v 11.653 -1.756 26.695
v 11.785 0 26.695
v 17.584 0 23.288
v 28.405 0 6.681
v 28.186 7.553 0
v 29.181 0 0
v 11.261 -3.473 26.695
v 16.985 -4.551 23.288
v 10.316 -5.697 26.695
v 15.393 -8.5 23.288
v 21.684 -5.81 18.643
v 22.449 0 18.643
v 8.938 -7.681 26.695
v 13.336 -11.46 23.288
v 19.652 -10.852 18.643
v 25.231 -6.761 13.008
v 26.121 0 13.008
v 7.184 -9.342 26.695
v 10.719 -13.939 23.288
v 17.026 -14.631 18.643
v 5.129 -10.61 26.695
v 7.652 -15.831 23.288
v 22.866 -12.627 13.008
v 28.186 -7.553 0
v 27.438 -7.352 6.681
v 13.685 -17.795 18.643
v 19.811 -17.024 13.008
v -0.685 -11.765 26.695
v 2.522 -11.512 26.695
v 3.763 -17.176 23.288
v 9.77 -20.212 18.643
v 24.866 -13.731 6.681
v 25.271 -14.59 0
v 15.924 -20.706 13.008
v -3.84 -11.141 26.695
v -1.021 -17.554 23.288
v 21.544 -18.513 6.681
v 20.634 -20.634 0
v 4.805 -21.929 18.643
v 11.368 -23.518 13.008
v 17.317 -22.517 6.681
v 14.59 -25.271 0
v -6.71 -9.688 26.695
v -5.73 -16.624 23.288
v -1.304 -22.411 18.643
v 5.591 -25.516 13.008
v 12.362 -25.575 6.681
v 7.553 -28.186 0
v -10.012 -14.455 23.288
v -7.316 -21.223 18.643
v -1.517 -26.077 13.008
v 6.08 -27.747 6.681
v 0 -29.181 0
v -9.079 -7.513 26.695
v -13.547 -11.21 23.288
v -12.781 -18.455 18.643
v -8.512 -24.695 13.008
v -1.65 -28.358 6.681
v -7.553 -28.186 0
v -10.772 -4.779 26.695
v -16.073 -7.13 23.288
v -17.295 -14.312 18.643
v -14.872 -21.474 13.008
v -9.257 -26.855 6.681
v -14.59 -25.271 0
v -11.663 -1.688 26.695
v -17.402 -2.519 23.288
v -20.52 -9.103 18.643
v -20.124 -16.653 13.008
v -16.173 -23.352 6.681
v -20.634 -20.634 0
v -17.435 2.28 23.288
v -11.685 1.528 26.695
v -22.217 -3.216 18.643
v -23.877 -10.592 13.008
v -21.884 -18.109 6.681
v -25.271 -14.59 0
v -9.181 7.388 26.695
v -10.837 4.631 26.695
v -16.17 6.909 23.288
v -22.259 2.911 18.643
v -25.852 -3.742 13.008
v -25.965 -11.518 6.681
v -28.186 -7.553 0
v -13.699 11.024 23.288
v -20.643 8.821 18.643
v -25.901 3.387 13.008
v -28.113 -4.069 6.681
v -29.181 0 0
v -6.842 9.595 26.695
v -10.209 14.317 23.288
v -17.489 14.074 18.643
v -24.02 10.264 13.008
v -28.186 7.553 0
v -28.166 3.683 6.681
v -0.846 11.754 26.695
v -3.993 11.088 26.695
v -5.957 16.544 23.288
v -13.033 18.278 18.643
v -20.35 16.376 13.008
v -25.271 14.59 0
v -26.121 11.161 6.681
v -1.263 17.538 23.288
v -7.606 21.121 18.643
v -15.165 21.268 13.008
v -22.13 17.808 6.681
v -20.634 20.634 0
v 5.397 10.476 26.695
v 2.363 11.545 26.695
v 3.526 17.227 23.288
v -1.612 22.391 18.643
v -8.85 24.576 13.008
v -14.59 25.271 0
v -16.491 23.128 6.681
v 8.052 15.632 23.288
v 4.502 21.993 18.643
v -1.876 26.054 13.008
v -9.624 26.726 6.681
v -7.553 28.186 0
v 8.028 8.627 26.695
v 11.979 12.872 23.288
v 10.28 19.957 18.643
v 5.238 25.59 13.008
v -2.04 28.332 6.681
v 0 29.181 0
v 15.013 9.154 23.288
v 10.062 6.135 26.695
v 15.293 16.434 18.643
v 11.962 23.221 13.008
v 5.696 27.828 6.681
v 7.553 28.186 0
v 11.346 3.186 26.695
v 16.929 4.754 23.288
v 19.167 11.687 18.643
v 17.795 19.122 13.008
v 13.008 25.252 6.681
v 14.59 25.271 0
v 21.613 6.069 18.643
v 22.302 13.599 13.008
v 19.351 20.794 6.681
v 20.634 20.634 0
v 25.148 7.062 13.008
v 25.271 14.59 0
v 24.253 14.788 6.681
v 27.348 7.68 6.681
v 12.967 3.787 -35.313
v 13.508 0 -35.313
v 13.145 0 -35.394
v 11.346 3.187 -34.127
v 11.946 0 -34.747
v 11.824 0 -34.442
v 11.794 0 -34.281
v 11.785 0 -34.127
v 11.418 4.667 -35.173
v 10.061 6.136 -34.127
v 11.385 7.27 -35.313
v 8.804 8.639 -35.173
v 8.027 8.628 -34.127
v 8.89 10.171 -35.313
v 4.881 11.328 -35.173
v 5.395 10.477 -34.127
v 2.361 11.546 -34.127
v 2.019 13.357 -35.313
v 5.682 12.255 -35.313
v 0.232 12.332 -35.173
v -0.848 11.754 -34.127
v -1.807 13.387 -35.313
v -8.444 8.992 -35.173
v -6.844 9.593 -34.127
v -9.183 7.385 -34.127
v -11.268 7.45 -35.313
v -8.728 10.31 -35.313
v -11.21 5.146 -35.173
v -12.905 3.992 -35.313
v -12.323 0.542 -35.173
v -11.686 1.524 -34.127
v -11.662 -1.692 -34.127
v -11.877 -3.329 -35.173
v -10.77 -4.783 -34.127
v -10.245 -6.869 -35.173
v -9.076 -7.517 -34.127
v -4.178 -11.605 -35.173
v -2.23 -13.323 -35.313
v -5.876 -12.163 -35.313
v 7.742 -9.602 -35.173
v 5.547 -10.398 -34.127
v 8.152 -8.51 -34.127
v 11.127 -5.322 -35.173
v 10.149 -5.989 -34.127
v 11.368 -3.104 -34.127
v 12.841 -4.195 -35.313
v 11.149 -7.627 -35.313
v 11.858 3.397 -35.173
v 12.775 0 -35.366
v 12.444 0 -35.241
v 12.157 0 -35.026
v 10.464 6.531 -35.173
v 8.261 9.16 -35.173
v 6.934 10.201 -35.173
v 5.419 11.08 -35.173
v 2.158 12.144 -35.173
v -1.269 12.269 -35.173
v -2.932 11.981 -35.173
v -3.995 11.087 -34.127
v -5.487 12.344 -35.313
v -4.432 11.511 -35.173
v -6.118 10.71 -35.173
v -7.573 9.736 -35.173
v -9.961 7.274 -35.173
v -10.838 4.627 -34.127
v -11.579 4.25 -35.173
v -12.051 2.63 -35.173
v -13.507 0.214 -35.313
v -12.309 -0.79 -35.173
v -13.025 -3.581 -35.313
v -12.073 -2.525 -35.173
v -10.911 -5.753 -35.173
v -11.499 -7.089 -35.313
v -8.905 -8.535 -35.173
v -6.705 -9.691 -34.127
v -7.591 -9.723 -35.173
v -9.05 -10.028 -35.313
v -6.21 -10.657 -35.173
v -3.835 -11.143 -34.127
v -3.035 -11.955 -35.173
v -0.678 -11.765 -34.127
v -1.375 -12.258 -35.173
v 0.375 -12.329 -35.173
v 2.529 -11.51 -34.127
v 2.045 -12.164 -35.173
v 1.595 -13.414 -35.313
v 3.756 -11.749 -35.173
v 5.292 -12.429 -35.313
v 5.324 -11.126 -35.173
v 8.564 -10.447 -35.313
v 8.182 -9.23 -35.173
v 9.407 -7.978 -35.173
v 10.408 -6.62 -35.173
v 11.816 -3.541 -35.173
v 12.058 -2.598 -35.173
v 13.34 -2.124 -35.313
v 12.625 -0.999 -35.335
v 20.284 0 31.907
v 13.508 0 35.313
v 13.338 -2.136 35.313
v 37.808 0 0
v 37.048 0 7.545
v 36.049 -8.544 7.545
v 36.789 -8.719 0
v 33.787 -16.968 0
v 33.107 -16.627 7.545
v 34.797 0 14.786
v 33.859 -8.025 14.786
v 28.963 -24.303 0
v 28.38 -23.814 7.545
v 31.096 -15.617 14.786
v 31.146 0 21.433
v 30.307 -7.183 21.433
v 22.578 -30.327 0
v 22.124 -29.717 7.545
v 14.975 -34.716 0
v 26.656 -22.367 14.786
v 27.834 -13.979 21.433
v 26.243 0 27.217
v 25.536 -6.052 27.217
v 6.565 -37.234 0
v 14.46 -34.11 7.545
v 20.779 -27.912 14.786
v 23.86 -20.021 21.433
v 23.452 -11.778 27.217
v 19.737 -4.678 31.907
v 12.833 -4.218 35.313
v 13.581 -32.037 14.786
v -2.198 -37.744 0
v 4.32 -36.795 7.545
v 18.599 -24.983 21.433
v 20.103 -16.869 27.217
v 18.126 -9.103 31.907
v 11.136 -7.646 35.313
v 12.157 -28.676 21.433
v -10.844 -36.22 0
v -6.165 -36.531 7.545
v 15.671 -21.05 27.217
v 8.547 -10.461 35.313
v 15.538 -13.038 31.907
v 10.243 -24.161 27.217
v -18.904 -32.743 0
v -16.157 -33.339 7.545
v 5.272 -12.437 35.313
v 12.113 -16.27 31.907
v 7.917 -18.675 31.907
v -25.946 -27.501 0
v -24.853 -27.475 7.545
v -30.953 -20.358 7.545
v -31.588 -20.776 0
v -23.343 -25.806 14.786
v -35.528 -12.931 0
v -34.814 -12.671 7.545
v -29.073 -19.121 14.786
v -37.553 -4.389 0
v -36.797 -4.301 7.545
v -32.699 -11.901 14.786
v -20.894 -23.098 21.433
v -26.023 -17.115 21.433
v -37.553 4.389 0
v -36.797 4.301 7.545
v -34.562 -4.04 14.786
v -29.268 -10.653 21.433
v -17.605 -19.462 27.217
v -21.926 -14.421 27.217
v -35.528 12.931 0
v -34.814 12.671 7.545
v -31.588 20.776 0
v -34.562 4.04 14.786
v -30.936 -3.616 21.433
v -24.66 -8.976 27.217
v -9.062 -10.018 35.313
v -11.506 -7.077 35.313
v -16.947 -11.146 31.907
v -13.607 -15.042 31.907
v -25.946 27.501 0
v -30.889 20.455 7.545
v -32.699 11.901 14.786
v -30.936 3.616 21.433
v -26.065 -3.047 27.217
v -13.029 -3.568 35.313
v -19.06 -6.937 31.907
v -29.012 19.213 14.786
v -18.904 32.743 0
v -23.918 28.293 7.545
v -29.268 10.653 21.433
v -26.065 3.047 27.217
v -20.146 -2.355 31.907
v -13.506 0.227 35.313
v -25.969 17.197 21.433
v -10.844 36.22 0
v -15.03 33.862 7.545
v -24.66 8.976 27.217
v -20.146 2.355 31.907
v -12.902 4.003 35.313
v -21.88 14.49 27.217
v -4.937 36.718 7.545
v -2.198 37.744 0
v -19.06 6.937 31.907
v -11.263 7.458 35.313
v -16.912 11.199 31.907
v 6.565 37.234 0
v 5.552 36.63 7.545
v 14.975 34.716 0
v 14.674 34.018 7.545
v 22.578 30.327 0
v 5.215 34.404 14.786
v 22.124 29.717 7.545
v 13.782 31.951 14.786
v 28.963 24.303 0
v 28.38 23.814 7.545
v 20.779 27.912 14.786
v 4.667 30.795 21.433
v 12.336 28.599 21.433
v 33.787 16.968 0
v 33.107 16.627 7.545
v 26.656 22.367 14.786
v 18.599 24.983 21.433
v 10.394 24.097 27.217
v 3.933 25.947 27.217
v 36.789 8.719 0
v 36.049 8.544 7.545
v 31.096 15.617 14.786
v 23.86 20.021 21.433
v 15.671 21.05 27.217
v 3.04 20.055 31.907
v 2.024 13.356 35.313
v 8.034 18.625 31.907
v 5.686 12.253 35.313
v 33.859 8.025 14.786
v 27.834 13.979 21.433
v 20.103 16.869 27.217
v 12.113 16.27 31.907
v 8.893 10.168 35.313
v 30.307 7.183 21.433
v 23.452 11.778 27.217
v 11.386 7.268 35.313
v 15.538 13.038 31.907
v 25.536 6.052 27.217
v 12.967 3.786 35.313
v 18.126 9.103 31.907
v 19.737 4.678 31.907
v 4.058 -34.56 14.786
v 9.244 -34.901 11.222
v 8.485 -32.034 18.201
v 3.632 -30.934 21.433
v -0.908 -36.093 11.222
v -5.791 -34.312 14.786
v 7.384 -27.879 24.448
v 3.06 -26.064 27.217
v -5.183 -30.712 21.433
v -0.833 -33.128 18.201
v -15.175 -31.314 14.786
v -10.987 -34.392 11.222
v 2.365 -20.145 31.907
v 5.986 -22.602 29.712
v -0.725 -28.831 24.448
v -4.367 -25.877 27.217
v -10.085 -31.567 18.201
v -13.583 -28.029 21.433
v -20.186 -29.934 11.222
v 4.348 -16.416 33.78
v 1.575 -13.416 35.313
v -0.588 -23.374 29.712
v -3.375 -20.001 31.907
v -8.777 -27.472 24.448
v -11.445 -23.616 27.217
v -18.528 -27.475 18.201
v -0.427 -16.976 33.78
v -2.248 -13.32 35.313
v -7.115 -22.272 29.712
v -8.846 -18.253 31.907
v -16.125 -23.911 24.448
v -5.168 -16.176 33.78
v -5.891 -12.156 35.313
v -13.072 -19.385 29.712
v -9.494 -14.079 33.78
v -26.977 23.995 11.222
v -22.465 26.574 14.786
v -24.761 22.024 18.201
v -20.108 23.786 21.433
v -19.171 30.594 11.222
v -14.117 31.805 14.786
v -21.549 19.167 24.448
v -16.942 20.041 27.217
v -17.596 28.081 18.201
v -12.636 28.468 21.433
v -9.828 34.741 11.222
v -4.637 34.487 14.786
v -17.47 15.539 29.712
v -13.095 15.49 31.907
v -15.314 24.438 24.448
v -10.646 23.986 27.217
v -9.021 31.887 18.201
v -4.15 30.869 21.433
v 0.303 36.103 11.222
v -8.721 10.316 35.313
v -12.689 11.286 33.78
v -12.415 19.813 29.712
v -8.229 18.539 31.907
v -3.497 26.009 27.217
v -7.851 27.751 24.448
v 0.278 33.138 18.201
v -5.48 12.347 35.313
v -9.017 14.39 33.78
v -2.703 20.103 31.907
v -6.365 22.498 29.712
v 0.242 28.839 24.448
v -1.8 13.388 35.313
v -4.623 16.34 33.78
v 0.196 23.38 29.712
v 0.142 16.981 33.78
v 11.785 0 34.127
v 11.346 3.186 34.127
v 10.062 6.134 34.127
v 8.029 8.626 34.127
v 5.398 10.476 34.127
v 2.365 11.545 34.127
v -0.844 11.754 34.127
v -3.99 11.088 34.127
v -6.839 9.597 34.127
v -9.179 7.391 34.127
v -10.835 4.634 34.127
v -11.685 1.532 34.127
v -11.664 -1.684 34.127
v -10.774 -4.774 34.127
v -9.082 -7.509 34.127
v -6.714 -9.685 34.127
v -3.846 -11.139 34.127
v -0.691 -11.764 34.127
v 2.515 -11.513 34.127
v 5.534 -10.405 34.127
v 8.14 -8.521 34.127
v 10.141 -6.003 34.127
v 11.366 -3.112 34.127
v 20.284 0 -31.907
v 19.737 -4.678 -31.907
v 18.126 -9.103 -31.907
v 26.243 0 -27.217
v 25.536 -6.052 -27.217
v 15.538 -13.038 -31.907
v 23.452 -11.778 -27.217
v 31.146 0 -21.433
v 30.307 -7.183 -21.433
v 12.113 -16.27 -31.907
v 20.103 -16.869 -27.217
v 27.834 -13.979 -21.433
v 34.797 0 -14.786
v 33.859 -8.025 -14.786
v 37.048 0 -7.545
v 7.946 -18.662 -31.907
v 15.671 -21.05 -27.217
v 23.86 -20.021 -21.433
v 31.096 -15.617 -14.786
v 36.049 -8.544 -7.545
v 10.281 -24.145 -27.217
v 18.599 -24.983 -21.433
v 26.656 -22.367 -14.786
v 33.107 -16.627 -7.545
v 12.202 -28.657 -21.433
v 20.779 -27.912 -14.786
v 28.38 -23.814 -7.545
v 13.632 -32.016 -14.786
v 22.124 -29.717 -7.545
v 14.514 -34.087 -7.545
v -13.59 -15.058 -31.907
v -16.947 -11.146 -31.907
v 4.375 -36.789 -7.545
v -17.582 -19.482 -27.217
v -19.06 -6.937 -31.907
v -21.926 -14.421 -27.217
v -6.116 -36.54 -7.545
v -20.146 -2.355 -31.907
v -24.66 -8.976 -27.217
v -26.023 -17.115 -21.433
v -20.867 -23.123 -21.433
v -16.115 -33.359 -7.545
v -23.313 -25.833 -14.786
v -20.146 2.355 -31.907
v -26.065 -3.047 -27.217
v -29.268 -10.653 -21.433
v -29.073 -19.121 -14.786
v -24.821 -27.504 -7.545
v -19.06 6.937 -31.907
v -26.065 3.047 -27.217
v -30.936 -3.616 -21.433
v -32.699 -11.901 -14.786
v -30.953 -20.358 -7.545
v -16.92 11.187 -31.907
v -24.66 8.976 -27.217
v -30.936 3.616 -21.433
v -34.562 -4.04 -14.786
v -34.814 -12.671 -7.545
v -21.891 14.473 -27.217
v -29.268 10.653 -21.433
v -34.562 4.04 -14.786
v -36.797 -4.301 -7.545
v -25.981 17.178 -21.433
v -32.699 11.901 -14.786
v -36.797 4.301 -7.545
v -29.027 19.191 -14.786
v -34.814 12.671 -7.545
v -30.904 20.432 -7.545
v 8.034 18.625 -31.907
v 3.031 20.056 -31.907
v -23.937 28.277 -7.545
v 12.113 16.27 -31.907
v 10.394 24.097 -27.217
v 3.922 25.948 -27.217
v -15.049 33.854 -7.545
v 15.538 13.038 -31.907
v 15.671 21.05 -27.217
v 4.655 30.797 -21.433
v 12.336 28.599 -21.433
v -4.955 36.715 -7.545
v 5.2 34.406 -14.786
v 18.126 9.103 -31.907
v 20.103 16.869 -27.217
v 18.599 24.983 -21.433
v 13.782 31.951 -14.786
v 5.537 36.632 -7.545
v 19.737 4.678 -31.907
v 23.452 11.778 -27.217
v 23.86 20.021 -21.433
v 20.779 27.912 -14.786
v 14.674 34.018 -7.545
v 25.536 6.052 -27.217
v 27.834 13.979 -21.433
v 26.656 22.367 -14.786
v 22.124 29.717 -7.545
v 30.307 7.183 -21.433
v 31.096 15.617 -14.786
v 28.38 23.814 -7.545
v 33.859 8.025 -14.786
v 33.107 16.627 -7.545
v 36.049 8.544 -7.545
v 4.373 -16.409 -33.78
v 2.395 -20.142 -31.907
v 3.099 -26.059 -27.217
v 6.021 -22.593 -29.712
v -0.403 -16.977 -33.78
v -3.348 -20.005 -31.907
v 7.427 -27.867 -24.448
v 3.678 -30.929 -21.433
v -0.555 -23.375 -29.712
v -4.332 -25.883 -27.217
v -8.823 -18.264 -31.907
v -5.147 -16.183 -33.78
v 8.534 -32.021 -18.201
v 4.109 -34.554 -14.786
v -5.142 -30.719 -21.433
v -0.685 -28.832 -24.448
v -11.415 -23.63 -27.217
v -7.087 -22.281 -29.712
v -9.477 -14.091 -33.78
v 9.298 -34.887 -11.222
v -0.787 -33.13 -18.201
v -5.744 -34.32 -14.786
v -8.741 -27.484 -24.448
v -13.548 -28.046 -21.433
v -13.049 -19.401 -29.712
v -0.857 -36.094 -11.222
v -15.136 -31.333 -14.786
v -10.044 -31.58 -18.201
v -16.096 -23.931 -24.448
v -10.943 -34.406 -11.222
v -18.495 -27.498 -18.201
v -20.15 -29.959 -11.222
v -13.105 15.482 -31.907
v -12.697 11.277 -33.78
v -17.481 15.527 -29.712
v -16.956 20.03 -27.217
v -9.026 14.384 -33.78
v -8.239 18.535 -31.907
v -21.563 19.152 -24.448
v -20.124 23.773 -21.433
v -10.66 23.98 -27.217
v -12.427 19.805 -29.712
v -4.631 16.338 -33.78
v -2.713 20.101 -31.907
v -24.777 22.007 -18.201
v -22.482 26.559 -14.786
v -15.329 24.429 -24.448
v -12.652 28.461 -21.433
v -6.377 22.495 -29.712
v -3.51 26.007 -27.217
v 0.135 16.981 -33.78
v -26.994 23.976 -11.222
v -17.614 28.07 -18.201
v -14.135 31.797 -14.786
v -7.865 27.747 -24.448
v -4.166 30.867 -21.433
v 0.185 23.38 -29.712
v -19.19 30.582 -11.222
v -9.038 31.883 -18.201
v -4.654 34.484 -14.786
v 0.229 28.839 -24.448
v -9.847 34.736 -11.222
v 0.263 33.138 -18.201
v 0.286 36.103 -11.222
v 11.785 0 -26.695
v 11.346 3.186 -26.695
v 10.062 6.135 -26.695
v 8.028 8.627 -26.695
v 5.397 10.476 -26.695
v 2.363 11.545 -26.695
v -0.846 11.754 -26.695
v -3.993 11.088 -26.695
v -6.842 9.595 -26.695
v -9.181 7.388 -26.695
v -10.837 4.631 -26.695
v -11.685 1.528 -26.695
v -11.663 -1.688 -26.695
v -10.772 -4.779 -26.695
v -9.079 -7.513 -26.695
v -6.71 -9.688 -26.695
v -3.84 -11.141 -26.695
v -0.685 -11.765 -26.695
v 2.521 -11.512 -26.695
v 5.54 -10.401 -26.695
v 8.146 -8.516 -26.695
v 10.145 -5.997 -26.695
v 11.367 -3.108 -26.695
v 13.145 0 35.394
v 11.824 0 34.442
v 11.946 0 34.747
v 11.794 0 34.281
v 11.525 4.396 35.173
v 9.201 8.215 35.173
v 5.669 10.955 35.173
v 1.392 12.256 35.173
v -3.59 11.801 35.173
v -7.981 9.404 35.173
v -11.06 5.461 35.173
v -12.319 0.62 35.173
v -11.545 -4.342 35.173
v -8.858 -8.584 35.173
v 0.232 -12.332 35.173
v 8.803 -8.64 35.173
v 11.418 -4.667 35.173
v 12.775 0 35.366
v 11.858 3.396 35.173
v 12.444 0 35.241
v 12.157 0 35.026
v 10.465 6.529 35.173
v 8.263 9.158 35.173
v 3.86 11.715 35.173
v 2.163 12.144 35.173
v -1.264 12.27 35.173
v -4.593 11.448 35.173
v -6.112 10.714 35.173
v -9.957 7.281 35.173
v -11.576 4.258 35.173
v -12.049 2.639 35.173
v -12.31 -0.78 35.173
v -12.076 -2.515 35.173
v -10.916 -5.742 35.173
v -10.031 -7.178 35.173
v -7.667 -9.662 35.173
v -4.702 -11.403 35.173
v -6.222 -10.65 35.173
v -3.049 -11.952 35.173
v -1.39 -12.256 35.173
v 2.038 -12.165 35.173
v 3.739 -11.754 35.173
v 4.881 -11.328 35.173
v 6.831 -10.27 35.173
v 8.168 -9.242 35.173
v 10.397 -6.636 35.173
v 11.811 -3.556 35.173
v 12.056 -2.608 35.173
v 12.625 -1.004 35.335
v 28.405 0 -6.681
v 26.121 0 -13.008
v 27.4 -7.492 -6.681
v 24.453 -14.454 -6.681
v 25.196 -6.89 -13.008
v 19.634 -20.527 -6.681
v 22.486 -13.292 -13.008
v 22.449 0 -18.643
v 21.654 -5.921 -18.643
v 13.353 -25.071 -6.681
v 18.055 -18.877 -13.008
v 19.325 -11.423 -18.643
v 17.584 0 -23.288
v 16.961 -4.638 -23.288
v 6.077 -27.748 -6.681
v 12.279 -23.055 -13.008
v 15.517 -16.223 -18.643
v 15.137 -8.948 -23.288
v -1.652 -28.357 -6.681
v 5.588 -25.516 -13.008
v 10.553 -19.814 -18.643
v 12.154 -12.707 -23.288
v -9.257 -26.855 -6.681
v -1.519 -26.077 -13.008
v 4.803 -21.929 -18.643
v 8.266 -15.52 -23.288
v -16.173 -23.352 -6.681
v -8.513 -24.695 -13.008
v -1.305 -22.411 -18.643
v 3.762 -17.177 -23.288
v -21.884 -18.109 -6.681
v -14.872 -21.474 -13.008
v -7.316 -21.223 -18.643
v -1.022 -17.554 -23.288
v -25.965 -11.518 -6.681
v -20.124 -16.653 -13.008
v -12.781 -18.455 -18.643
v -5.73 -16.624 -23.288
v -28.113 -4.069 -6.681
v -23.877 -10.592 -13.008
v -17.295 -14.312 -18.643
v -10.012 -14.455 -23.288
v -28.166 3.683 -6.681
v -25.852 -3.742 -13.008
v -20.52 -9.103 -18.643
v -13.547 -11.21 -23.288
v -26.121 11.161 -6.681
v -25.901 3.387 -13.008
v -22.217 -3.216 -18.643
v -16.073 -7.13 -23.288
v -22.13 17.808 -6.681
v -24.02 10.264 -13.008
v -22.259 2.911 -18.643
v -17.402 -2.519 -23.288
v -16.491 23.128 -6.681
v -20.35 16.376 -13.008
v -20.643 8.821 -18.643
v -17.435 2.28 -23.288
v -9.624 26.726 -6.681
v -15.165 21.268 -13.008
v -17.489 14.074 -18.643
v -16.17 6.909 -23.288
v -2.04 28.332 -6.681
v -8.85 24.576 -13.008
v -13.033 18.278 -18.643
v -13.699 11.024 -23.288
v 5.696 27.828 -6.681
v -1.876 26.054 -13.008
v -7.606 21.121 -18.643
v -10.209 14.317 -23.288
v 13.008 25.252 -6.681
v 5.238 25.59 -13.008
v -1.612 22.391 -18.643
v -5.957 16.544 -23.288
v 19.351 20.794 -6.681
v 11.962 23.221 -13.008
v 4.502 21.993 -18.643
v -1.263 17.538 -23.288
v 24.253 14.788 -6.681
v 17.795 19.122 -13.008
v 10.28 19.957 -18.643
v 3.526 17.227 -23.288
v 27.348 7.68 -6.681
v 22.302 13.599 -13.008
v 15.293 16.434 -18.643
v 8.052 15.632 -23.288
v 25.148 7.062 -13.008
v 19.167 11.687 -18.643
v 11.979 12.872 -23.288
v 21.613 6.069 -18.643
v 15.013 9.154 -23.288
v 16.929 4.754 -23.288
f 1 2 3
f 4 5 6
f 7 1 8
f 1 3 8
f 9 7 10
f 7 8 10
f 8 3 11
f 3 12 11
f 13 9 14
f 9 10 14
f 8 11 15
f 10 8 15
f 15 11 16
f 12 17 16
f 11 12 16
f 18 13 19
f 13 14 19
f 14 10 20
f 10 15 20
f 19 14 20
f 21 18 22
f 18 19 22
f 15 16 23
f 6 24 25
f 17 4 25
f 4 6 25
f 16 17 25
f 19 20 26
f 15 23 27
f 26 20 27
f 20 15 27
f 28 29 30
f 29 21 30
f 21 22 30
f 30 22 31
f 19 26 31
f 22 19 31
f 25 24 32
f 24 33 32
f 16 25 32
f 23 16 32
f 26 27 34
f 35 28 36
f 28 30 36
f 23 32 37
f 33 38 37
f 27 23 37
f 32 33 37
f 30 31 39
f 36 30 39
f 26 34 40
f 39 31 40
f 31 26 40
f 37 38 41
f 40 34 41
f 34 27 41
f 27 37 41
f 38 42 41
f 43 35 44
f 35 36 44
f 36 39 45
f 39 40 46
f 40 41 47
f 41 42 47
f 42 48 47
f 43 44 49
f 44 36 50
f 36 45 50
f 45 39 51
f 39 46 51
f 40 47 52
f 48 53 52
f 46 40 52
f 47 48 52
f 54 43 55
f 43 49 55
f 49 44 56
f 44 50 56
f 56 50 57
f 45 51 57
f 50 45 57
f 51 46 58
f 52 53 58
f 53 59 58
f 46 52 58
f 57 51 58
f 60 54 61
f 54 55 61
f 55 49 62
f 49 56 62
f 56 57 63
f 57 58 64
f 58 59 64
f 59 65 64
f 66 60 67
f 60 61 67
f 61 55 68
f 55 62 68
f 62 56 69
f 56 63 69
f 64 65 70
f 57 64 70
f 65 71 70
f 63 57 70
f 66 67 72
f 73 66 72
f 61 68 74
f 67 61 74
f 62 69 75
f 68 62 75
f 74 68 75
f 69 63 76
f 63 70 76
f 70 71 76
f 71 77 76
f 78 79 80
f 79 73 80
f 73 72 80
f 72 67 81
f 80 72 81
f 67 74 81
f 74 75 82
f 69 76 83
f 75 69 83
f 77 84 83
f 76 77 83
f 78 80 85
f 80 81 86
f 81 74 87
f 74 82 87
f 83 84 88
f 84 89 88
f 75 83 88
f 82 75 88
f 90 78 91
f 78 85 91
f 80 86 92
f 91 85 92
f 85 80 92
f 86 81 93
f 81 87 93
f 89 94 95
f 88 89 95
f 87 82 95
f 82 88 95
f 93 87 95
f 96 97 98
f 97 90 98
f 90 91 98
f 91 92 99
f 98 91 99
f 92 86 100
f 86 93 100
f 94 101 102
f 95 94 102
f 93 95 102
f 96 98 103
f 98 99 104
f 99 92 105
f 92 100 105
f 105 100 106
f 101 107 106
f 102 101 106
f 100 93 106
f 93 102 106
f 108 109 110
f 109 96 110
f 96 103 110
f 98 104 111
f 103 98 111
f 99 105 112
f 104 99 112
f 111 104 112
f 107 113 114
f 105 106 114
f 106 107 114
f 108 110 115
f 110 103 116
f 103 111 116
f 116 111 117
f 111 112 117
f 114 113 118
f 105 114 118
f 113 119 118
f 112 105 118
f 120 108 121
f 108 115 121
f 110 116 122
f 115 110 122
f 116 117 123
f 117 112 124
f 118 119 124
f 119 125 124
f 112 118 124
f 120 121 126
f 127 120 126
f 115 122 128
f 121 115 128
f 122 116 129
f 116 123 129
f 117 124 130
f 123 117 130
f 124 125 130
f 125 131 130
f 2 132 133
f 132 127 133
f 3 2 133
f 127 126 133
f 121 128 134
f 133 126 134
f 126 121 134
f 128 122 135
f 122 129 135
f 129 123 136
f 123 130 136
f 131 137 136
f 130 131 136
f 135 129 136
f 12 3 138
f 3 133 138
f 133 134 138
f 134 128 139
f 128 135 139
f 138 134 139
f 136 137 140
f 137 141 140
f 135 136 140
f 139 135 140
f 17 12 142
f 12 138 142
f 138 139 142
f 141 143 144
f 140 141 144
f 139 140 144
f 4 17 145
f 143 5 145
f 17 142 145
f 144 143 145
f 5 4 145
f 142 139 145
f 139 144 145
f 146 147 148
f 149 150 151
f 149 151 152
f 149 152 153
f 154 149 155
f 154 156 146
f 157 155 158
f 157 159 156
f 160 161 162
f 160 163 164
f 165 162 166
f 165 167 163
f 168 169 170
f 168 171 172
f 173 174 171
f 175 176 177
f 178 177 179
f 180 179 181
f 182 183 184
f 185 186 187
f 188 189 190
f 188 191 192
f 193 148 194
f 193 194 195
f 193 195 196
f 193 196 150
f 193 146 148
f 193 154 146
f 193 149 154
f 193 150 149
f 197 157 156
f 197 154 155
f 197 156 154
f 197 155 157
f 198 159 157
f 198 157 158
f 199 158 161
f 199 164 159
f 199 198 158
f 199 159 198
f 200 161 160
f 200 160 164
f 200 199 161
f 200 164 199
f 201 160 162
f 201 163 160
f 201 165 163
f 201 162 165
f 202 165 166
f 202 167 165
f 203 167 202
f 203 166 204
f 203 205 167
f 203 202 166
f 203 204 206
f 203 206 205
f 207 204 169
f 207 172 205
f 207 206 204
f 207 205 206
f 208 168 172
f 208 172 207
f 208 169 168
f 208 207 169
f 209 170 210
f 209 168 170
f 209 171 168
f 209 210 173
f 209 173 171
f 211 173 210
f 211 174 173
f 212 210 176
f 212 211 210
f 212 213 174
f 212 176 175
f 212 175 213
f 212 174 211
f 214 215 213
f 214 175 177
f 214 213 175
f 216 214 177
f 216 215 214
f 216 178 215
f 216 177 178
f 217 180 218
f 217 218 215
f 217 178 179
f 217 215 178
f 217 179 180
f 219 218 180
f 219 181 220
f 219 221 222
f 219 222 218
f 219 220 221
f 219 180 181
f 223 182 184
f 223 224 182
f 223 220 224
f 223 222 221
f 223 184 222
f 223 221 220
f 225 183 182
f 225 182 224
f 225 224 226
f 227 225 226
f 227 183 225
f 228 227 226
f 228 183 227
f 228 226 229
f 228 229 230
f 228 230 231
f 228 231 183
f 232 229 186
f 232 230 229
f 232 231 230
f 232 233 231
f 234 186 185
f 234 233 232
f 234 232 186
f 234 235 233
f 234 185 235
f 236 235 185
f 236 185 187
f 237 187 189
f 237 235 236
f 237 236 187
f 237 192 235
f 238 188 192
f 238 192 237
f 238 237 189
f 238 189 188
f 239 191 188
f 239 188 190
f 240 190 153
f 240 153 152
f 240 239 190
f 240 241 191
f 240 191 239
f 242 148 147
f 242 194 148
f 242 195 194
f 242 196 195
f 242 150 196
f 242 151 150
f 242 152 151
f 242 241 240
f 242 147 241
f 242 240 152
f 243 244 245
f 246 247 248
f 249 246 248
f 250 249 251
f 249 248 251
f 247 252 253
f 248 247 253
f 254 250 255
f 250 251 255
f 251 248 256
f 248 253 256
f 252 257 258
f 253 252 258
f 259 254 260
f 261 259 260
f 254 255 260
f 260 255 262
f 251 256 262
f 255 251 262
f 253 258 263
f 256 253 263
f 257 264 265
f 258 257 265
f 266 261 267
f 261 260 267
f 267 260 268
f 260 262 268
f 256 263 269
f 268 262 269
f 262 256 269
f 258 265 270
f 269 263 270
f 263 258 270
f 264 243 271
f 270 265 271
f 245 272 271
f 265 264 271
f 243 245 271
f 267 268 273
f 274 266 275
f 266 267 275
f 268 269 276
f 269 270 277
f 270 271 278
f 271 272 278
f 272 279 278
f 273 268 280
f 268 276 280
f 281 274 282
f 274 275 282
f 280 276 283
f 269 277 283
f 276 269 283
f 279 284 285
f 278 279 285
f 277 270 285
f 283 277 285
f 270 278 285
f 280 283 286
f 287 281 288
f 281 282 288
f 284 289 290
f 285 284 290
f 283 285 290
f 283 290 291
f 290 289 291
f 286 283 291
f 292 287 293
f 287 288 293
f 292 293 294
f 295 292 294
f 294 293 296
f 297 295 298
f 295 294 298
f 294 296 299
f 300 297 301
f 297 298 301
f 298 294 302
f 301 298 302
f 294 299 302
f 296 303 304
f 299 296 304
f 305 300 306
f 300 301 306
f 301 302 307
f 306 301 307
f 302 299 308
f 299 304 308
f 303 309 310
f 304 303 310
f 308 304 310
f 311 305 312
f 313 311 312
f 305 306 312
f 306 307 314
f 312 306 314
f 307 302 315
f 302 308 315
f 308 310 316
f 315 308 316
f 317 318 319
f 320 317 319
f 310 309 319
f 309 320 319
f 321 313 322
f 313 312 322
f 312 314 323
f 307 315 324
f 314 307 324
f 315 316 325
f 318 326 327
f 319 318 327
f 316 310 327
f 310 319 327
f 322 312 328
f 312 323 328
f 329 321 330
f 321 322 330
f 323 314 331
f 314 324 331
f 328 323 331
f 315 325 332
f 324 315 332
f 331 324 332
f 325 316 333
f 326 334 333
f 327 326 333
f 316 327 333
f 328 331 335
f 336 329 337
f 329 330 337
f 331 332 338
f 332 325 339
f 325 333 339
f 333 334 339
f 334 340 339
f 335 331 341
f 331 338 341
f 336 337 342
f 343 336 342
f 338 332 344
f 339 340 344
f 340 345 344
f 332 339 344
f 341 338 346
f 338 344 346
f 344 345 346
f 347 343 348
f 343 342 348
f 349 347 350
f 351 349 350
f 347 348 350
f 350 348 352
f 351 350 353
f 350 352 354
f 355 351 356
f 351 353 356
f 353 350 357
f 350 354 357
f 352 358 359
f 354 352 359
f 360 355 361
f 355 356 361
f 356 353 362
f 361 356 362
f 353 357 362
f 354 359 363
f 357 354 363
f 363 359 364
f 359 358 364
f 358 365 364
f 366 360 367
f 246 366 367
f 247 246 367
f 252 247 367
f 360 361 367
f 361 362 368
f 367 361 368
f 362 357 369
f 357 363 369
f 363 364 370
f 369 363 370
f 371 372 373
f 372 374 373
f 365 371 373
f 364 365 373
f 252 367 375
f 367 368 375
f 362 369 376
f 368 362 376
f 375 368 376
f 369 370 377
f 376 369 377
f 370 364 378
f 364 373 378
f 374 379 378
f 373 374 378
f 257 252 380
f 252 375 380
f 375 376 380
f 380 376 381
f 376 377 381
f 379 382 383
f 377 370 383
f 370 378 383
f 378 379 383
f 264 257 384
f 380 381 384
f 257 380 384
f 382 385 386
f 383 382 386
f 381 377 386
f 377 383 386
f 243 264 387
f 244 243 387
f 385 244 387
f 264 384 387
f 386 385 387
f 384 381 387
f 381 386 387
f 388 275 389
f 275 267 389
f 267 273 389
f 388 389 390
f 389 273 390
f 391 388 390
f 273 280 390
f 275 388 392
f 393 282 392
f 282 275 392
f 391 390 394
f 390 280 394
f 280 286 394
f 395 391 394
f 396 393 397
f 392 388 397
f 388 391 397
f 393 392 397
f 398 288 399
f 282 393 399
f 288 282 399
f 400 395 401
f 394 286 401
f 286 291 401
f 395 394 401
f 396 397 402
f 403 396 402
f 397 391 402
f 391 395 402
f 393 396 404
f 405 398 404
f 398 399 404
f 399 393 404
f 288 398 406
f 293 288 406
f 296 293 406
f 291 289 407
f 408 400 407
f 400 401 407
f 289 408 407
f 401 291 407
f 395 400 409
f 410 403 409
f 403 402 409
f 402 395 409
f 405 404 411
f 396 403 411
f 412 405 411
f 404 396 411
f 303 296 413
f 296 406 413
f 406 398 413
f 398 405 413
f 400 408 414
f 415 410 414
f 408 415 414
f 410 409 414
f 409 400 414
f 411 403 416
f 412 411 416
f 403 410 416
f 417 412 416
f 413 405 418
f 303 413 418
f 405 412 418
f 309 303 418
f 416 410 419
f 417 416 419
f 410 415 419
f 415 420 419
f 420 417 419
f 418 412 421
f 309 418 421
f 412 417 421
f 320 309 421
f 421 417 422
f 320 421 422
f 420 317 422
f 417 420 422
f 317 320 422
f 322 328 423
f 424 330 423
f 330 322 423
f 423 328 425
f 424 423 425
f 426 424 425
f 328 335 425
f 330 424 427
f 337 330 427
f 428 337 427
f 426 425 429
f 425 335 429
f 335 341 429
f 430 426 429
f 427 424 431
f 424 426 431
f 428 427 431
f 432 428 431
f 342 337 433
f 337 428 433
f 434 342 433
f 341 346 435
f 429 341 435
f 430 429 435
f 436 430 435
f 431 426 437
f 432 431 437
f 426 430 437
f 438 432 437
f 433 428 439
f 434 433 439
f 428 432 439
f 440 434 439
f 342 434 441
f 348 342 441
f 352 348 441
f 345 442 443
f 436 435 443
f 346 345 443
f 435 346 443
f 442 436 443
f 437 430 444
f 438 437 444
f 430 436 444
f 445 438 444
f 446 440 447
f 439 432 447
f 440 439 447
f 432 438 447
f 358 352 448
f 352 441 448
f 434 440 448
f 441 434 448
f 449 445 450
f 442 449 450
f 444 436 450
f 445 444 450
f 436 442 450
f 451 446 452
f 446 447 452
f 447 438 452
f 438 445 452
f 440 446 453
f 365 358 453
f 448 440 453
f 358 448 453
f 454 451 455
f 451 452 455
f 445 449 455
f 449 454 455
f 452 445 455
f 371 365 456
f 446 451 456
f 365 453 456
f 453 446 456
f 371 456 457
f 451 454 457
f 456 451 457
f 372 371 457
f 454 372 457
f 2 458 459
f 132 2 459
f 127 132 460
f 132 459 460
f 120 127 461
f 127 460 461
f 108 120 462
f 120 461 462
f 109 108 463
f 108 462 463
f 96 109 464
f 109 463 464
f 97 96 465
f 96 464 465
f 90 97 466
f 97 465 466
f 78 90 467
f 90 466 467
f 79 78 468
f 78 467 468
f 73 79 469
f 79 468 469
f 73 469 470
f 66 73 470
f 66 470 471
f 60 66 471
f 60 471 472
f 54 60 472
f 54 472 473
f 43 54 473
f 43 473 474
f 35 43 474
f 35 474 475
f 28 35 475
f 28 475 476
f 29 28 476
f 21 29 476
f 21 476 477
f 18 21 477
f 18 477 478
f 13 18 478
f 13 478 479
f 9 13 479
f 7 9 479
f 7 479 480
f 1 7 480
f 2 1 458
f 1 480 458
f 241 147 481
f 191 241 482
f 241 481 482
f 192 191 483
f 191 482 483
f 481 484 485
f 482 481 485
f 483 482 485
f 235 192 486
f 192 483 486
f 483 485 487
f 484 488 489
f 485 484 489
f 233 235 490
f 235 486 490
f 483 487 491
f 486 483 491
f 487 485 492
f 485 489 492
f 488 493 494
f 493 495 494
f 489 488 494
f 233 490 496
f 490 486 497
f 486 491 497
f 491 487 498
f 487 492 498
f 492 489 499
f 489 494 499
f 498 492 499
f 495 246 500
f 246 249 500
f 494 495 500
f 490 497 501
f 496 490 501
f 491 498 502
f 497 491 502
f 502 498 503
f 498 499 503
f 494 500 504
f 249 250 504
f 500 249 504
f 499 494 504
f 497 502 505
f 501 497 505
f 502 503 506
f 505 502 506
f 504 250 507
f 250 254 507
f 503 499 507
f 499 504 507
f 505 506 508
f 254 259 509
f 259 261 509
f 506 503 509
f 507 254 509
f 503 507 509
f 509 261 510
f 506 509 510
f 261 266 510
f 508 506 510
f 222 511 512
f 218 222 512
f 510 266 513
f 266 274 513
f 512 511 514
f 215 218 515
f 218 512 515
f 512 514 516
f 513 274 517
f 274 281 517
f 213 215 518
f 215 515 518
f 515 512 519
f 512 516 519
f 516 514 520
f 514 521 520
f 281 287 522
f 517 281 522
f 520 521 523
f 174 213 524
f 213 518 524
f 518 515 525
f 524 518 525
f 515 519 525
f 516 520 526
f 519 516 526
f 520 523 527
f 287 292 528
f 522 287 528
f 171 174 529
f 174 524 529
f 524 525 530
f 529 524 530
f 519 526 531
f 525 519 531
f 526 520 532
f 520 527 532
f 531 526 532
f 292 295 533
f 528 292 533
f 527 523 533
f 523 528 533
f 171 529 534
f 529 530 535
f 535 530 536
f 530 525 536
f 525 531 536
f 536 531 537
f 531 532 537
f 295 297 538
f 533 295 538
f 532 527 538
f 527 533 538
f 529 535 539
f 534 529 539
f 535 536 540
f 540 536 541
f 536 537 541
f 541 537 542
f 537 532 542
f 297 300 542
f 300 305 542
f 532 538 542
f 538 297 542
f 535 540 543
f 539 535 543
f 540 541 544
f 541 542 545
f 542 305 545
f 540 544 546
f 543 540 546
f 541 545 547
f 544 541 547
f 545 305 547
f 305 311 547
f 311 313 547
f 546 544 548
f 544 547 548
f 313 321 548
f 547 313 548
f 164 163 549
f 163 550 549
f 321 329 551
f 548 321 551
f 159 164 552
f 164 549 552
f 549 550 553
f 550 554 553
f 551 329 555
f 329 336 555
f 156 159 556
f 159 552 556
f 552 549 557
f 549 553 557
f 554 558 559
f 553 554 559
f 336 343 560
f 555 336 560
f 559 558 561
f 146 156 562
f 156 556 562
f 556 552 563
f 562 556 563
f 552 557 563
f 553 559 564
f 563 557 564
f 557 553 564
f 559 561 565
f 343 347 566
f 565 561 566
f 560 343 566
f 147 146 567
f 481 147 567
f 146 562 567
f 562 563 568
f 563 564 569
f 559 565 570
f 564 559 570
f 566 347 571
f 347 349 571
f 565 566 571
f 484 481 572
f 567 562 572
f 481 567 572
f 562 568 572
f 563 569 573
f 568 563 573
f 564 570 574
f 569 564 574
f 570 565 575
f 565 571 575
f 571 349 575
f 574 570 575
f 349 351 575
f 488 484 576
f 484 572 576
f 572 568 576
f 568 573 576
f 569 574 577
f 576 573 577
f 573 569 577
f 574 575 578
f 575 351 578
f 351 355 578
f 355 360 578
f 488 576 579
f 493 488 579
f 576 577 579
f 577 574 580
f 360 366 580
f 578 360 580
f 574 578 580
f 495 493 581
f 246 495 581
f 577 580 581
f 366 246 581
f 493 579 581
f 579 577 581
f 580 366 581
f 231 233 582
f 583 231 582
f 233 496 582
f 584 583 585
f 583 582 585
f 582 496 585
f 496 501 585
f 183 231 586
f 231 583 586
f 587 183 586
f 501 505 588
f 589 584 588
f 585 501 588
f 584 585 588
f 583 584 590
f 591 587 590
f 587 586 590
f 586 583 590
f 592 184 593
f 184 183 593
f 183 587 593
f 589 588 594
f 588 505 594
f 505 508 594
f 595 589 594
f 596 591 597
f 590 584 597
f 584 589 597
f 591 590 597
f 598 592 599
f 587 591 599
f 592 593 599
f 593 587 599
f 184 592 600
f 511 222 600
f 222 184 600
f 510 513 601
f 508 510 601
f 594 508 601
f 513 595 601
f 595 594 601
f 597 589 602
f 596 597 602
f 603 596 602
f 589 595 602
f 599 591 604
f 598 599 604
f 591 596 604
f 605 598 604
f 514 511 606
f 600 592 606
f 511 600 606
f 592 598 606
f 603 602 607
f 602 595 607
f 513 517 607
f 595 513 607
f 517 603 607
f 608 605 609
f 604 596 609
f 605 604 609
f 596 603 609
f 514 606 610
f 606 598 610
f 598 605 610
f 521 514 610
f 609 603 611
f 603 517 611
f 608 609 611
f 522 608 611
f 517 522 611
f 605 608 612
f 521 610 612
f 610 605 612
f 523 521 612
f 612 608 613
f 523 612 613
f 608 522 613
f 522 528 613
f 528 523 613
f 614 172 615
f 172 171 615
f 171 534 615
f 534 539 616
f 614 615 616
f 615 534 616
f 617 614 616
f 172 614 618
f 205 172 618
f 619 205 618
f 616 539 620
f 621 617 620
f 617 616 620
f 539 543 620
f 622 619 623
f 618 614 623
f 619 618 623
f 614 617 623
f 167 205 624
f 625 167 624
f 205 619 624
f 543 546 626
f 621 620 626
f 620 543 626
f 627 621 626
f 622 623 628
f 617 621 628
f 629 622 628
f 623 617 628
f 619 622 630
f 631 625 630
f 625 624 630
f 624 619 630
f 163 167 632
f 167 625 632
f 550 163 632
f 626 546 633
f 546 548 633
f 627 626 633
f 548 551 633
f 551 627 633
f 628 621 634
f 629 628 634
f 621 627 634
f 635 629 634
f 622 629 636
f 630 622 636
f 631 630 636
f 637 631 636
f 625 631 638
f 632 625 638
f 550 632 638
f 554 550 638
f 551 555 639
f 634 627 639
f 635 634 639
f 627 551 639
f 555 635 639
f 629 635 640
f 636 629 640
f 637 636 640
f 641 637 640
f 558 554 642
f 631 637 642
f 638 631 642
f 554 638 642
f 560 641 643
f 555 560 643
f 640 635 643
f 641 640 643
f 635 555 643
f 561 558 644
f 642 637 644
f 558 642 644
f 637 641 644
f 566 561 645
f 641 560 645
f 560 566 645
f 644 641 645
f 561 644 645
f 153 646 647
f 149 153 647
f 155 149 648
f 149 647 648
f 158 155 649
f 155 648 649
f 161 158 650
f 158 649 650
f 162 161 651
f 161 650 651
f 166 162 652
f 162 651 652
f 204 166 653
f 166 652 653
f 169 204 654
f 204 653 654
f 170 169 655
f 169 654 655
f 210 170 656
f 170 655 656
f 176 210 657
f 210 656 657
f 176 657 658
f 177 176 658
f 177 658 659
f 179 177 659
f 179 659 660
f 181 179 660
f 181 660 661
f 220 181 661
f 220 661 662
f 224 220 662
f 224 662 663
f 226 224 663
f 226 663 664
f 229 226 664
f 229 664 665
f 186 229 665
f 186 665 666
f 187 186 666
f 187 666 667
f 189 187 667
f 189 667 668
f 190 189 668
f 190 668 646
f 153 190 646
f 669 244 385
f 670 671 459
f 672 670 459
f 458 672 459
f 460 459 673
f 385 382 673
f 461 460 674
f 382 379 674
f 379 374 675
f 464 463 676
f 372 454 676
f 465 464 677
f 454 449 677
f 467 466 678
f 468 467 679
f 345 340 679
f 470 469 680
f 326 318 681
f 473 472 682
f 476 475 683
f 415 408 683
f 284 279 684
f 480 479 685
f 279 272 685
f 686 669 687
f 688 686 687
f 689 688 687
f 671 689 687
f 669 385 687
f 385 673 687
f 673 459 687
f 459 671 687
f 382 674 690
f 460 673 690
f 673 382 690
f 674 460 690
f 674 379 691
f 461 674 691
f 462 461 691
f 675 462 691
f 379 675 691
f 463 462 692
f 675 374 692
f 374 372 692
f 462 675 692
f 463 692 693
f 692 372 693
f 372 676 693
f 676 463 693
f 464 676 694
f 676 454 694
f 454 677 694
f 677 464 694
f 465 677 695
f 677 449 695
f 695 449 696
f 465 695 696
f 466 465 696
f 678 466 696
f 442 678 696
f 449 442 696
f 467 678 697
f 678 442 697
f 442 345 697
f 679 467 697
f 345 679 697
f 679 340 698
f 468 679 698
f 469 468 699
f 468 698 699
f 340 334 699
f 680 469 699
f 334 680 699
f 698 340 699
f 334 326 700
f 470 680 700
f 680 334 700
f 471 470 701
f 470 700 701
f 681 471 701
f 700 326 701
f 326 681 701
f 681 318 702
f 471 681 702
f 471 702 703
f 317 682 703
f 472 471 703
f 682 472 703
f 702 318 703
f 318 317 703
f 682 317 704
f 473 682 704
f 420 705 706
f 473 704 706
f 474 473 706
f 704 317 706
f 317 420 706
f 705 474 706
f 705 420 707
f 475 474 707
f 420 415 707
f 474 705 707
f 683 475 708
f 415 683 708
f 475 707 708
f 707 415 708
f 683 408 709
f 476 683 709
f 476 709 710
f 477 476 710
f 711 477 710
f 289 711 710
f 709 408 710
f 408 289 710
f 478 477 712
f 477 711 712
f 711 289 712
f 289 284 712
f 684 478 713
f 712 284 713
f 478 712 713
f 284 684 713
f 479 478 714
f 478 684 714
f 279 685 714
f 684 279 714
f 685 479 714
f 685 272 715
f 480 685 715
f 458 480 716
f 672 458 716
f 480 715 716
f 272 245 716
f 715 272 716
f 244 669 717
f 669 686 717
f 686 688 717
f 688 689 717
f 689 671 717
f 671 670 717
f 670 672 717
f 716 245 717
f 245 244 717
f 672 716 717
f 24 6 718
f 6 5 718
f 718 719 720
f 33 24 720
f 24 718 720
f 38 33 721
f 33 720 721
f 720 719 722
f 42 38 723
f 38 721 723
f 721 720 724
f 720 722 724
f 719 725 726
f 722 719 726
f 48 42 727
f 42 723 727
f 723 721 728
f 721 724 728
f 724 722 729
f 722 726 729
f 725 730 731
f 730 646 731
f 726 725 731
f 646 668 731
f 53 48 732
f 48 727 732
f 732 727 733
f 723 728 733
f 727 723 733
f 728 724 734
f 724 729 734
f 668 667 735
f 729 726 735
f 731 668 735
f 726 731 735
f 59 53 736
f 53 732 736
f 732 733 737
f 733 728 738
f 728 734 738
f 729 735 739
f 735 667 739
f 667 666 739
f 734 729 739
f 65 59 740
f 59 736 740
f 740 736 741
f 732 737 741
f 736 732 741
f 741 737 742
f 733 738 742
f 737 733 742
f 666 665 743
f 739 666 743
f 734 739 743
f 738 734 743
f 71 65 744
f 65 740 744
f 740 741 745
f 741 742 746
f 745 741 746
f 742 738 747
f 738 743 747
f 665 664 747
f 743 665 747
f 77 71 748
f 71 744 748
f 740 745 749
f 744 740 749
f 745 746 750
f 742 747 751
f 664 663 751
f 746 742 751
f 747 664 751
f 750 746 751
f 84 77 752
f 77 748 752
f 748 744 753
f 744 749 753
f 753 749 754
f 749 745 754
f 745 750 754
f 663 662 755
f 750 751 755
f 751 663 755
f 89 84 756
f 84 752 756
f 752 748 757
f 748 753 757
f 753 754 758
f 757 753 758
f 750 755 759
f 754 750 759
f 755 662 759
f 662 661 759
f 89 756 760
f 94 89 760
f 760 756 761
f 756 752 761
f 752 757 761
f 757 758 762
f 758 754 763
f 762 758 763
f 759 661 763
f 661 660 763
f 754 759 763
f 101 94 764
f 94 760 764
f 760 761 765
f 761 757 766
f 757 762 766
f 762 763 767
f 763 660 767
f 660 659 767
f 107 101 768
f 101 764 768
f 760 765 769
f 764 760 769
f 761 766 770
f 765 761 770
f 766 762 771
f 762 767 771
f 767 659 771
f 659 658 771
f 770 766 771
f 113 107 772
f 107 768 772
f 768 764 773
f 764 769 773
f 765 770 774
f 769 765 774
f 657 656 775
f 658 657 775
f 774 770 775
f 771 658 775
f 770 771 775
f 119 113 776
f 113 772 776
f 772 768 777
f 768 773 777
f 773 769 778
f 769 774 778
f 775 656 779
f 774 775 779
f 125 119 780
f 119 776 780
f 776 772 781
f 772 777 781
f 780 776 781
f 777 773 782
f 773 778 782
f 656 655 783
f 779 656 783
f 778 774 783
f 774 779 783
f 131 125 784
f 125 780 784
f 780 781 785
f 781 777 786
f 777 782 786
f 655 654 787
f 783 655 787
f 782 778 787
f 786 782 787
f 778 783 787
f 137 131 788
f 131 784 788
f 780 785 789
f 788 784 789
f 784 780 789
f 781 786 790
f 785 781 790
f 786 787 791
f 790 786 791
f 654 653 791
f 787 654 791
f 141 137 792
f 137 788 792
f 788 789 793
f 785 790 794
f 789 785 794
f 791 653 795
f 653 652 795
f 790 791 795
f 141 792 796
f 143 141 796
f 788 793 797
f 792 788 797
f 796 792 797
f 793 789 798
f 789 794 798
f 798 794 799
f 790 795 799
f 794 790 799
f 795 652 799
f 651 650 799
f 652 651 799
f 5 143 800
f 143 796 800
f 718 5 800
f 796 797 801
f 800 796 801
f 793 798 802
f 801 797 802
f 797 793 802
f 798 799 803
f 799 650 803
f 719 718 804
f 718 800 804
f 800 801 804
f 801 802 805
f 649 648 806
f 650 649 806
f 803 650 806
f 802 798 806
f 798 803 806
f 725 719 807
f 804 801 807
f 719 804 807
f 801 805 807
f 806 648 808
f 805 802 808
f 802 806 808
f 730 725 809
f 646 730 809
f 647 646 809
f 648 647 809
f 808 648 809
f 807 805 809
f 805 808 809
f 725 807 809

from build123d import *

# Parameters (mm, degrees)
F3_R     = 11.784593
F4_DEPTH = 127
F5_R     = 1.27


with BuildPart() as f1:
    # F0 (on Front) → F1 (revolve)
    with BuildSketch(Plane.XZ):
        with BuildLine():
            ThreePointArc((0, -37.808439), (26.734604, -26.734604), (37.808439, 0))
            ThreePointArc((37.808439, 0), (26.734604, 26.734604), (0, 37.808439))
            Line((0, 37.808439), (0, 29.18069))
            ThreePointArc((0, 29.18069), (20.633864, 20.633864), (29.18069, 0))
            ThreePointArc((29.18069, 0), (20.633864, -20.633864), (0, -29.18069))
            Line((0, -29.18069), (0, -37.808439))
        make_face()
    revolve(axis=Axis((0, 0, -0.202816), (0, 0, -1)))

    # F3 (on offset) → F4 (cut)
    with BuildSketch(Plane.XY.offset(42.672)):
        Circle(F3_R)
    extrude(amount=-F4_DEPTH, mode=Mode.SUBTRACT)

    # F5
    f5_edges = [f1.edges().sort_by_distance(p)[0] for p in [
        (-11.784593, 0, 35.924942),
        (37.808439, 0, 0),
        (-11.784593, 0, -35.924942),
    ]]
    fillet(f5_edges, radius=F5_R)


solid = f1.part
